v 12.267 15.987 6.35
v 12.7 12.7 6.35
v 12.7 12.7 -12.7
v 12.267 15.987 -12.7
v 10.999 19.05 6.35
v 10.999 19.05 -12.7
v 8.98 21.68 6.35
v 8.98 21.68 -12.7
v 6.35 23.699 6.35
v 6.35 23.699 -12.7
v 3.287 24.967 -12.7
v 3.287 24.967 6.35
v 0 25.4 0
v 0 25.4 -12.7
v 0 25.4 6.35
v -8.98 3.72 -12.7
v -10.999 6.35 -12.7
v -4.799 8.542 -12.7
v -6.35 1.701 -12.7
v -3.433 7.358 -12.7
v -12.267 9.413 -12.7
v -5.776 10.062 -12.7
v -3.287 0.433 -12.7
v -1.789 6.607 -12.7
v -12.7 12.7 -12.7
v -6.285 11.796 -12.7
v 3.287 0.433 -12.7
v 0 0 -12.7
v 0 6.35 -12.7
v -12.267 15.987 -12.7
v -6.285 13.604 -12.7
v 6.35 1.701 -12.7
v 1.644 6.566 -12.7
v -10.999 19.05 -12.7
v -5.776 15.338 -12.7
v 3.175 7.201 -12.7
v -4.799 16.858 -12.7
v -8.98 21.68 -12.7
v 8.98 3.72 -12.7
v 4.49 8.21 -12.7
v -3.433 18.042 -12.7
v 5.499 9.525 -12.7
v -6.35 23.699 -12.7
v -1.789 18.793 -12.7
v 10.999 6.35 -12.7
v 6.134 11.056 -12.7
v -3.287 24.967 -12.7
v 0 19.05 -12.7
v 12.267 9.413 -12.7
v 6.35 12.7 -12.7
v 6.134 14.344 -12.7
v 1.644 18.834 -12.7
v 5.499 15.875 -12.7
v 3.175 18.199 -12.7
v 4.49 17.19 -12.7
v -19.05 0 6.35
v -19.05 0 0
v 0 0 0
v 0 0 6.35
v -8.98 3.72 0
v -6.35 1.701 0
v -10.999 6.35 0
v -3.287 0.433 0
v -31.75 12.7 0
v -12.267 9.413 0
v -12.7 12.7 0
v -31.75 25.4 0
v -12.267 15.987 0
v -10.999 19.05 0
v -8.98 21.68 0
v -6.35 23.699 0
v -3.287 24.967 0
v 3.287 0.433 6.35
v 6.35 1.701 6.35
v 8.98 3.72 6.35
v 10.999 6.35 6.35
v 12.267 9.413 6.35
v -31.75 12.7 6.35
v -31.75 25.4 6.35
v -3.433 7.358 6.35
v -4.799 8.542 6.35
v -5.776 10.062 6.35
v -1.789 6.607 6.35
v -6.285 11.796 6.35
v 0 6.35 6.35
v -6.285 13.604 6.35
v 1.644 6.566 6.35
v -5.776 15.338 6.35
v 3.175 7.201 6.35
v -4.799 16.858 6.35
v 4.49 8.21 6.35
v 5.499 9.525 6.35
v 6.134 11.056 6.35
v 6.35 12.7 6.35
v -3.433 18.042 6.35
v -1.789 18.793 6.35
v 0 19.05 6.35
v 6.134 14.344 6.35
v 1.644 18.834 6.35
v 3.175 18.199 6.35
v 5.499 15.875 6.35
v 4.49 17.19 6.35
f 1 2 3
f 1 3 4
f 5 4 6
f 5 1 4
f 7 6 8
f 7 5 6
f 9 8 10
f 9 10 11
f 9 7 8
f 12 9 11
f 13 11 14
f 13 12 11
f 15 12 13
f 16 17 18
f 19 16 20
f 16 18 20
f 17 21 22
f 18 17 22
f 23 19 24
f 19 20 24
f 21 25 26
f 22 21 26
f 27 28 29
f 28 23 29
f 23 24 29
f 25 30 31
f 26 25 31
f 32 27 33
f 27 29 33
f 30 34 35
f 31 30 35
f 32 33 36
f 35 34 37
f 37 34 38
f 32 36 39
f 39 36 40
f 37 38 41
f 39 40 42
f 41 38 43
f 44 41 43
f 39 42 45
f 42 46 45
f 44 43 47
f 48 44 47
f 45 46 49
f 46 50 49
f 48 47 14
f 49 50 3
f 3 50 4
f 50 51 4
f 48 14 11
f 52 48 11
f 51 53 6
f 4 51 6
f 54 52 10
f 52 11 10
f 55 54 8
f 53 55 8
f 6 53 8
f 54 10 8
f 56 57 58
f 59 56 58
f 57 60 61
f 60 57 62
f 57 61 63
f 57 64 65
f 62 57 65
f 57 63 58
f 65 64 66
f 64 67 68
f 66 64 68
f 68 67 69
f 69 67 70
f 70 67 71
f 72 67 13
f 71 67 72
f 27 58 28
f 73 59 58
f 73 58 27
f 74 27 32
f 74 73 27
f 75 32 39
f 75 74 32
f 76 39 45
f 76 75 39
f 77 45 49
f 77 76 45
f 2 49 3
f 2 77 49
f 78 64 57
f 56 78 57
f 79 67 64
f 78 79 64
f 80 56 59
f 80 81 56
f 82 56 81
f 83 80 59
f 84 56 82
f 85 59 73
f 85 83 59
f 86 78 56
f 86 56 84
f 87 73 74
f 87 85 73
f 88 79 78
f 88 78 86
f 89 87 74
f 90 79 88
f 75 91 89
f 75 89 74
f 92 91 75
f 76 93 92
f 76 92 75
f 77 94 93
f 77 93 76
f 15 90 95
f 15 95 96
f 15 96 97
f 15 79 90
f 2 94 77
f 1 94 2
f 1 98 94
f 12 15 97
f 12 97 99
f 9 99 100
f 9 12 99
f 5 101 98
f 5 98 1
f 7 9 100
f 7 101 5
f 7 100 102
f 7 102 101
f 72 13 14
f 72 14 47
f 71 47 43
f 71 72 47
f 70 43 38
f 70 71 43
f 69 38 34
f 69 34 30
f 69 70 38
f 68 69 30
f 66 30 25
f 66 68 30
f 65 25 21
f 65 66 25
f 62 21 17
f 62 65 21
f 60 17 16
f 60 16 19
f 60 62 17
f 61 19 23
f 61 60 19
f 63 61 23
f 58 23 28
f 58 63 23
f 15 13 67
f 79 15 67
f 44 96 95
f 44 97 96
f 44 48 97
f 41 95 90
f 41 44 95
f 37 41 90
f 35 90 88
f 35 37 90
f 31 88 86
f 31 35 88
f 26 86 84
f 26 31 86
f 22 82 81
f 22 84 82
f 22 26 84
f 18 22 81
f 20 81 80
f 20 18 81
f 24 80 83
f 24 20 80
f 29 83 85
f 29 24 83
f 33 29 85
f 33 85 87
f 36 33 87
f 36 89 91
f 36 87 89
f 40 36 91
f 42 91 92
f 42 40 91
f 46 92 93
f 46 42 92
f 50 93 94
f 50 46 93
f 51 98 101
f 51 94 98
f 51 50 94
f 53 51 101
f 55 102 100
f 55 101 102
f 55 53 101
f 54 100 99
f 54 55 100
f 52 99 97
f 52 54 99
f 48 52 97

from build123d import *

# Parameters (mm, degrees)
F1_DEPTH = 6.35
F3_DEPTH = 19.05
F4_DEPTH = 6.351


with BuildPart() as f1:
    # F0 (on Top) → F1 (new body)
    with BuildSketch(Plane.XY):
        Polygon((-19.05, 0), (0, 0), (0, 25.4), (-31.75, 25.4), (-31.75, 12.7), align=None)
    extrude(amount=F1_DEPTH)

    # F2 (on face) → F3 (join)
    with BuildSketch(Plane.XY.offset(6.35)):
        with BuildLine():
            ThreePointArc((0, 0), (8.9802561211, 3.7197438789), (12.7, 12.7))
            ThreePointArc((12.7, 12.7), (8.9802561211, 21.6802561211), (0, 25.4))
            Line((0, 25.4), (0, 19.05))
            ThreePointArc((0, 19.05), (4.4901280605, 17.1901280605), (6.35, 12.7))
            ThreePointArc((6.35, 12.7), (4.4901280605, 8.2098719395), (0, 6.35))
            Line((0, 6.35), (0, 0))
        make_face()
        with BuildLine():
            Line((0, 19.05), (0, 25.4))
            ThreePointArc((0, 25.4), (-12.7, 12.7), (0, 0))
            Line((0, 0), (0, 6.35))
            ThreePointArc((0, 6.35), (-6.35, 12.7), (0, 19.05))
        make_face()
    extrude(amount=-F3_DEPTH)

    # F4 (cut, through all): a face of the model
    f4_faces = [f1.faces().sort_by_distance(p)[0] for p in [
        (-2.695023703, 12.7, 0),
    ]]
    extrude(f4_faces, amount=-F4_DEPTH, mode=Mode.SUBTRACT)


solid = f1.part
